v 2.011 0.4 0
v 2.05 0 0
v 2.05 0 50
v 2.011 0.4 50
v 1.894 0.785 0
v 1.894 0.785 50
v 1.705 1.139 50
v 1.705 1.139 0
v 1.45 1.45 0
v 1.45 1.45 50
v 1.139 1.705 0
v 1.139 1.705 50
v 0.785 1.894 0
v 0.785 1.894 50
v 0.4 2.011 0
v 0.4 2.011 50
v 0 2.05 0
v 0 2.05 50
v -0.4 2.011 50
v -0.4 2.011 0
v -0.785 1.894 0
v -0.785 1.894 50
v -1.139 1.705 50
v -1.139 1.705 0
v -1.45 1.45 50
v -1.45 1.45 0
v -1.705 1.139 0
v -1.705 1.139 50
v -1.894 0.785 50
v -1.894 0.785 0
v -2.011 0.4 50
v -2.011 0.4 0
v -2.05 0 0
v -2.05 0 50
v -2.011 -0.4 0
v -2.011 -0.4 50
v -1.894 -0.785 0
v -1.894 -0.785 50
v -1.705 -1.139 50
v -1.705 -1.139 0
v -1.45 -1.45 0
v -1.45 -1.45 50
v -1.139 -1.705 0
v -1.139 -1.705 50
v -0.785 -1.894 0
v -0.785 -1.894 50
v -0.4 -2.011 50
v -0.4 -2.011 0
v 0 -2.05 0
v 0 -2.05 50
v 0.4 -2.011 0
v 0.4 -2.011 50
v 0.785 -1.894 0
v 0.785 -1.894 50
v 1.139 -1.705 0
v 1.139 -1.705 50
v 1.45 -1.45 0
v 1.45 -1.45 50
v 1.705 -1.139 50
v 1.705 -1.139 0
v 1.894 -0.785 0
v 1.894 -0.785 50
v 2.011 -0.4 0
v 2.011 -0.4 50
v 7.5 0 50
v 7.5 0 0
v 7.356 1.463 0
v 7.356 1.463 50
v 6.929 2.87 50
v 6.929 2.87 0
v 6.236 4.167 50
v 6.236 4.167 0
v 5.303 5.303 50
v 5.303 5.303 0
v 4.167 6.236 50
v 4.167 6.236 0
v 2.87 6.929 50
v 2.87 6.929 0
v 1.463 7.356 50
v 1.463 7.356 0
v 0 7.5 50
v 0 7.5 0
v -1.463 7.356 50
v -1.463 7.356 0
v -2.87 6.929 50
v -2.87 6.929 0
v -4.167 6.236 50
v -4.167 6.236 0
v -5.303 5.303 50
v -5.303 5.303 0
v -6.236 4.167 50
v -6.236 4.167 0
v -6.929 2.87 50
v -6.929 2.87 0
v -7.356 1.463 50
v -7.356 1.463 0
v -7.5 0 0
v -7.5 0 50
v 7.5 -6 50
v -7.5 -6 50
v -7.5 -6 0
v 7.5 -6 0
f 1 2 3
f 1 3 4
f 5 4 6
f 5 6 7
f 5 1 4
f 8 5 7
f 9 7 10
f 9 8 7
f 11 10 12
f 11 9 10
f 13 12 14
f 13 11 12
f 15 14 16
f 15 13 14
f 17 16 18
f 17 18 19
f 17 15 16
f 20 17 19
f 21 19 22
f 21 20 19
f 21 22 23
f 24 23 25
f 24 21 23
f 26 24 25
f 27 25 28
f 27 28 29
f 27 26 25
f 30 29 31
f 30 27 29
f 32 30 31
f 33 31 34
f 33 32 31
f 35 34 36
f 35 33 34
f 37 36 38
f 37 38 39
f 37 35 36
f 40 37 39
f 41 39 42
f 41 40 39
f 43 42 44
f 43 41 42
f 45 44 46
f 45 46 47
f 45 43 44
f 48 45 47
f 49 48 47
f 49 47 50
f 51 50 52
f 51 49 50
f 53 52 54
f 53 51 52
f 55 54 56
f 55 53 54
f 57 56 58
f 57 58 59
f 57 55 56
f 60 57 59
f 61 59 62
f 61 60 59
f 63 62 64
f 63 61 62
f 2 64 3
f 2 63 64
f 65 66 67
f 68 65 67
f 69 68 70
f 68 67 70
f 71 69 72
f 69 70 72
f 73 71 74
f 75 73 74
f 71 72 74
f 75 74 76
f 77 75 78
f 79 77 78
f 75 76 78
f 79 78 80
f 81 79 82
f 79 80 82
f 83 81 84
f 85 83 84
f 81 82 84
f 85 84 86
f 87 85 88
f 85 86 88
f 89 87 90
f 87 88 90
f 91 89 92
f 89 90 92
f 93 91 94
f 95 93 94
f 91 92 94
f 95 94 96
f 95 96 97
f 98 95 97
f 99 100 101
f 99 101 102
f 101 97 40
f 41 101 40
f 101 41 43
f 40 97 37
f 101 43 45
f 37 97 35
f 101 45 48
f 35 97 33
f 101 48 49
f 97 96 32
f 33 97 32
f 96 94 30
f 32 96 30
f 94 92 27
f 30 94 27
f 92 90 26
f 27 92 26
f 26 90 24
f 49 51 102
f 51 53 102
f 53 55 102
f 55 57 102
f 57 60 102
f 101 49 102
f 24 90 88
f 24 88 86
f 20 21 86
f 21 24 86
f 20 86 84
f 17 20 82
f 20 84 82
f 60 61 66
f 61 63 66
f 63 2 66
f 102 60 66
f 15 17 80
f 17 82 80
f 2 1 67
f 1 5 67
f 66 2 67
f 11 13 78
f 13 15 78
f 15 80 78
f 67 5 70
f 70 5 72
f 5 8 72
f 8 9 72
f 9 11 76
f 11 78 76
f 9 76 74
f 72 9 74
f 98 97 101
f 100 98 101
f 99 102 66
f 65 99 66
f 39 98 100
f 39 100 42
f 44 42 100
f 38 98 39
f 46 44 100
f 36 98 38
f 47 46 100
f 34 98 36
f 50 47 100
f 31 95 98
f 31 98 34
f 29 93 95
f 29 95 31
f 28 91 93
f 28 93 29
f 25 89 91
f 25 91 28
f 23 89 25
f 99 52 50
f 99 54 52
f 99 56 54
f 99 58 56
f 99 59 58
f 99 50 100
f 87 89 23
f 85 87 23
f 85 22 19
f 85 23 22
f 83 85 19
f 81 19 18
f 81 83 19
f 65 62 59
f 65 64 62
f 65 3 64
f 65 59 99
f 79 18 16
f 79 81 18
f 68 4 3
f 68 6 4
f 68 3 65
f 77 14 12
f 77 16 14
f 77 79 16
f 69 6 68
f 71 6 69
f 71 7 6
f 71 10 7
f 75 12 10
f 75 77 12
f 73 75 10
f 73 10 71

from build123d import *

# Parameters (mm, degrees)
F0_R     = 2.05
F1_DEPTH = 50


with BuildPart() as f1:
    # F0 (on Top) → F1 (new body)
    with BuildSketch(Plane.XY):
        with BuildLine():
            ThreePointArc((7.5, 0), (0, 7.5), (-7.5, 0))
            Line((-7.5, 0), (-7.5, -6))
            Line((-7.5, -6), (7.5, -6))
            Line((7.5, -6), (7.5, 0))
        make_face()
        Circle(F0_R, mode=Mode.SUBTRACT)
    extrude(amount=F1_DEPTH)


solid = f1.part
